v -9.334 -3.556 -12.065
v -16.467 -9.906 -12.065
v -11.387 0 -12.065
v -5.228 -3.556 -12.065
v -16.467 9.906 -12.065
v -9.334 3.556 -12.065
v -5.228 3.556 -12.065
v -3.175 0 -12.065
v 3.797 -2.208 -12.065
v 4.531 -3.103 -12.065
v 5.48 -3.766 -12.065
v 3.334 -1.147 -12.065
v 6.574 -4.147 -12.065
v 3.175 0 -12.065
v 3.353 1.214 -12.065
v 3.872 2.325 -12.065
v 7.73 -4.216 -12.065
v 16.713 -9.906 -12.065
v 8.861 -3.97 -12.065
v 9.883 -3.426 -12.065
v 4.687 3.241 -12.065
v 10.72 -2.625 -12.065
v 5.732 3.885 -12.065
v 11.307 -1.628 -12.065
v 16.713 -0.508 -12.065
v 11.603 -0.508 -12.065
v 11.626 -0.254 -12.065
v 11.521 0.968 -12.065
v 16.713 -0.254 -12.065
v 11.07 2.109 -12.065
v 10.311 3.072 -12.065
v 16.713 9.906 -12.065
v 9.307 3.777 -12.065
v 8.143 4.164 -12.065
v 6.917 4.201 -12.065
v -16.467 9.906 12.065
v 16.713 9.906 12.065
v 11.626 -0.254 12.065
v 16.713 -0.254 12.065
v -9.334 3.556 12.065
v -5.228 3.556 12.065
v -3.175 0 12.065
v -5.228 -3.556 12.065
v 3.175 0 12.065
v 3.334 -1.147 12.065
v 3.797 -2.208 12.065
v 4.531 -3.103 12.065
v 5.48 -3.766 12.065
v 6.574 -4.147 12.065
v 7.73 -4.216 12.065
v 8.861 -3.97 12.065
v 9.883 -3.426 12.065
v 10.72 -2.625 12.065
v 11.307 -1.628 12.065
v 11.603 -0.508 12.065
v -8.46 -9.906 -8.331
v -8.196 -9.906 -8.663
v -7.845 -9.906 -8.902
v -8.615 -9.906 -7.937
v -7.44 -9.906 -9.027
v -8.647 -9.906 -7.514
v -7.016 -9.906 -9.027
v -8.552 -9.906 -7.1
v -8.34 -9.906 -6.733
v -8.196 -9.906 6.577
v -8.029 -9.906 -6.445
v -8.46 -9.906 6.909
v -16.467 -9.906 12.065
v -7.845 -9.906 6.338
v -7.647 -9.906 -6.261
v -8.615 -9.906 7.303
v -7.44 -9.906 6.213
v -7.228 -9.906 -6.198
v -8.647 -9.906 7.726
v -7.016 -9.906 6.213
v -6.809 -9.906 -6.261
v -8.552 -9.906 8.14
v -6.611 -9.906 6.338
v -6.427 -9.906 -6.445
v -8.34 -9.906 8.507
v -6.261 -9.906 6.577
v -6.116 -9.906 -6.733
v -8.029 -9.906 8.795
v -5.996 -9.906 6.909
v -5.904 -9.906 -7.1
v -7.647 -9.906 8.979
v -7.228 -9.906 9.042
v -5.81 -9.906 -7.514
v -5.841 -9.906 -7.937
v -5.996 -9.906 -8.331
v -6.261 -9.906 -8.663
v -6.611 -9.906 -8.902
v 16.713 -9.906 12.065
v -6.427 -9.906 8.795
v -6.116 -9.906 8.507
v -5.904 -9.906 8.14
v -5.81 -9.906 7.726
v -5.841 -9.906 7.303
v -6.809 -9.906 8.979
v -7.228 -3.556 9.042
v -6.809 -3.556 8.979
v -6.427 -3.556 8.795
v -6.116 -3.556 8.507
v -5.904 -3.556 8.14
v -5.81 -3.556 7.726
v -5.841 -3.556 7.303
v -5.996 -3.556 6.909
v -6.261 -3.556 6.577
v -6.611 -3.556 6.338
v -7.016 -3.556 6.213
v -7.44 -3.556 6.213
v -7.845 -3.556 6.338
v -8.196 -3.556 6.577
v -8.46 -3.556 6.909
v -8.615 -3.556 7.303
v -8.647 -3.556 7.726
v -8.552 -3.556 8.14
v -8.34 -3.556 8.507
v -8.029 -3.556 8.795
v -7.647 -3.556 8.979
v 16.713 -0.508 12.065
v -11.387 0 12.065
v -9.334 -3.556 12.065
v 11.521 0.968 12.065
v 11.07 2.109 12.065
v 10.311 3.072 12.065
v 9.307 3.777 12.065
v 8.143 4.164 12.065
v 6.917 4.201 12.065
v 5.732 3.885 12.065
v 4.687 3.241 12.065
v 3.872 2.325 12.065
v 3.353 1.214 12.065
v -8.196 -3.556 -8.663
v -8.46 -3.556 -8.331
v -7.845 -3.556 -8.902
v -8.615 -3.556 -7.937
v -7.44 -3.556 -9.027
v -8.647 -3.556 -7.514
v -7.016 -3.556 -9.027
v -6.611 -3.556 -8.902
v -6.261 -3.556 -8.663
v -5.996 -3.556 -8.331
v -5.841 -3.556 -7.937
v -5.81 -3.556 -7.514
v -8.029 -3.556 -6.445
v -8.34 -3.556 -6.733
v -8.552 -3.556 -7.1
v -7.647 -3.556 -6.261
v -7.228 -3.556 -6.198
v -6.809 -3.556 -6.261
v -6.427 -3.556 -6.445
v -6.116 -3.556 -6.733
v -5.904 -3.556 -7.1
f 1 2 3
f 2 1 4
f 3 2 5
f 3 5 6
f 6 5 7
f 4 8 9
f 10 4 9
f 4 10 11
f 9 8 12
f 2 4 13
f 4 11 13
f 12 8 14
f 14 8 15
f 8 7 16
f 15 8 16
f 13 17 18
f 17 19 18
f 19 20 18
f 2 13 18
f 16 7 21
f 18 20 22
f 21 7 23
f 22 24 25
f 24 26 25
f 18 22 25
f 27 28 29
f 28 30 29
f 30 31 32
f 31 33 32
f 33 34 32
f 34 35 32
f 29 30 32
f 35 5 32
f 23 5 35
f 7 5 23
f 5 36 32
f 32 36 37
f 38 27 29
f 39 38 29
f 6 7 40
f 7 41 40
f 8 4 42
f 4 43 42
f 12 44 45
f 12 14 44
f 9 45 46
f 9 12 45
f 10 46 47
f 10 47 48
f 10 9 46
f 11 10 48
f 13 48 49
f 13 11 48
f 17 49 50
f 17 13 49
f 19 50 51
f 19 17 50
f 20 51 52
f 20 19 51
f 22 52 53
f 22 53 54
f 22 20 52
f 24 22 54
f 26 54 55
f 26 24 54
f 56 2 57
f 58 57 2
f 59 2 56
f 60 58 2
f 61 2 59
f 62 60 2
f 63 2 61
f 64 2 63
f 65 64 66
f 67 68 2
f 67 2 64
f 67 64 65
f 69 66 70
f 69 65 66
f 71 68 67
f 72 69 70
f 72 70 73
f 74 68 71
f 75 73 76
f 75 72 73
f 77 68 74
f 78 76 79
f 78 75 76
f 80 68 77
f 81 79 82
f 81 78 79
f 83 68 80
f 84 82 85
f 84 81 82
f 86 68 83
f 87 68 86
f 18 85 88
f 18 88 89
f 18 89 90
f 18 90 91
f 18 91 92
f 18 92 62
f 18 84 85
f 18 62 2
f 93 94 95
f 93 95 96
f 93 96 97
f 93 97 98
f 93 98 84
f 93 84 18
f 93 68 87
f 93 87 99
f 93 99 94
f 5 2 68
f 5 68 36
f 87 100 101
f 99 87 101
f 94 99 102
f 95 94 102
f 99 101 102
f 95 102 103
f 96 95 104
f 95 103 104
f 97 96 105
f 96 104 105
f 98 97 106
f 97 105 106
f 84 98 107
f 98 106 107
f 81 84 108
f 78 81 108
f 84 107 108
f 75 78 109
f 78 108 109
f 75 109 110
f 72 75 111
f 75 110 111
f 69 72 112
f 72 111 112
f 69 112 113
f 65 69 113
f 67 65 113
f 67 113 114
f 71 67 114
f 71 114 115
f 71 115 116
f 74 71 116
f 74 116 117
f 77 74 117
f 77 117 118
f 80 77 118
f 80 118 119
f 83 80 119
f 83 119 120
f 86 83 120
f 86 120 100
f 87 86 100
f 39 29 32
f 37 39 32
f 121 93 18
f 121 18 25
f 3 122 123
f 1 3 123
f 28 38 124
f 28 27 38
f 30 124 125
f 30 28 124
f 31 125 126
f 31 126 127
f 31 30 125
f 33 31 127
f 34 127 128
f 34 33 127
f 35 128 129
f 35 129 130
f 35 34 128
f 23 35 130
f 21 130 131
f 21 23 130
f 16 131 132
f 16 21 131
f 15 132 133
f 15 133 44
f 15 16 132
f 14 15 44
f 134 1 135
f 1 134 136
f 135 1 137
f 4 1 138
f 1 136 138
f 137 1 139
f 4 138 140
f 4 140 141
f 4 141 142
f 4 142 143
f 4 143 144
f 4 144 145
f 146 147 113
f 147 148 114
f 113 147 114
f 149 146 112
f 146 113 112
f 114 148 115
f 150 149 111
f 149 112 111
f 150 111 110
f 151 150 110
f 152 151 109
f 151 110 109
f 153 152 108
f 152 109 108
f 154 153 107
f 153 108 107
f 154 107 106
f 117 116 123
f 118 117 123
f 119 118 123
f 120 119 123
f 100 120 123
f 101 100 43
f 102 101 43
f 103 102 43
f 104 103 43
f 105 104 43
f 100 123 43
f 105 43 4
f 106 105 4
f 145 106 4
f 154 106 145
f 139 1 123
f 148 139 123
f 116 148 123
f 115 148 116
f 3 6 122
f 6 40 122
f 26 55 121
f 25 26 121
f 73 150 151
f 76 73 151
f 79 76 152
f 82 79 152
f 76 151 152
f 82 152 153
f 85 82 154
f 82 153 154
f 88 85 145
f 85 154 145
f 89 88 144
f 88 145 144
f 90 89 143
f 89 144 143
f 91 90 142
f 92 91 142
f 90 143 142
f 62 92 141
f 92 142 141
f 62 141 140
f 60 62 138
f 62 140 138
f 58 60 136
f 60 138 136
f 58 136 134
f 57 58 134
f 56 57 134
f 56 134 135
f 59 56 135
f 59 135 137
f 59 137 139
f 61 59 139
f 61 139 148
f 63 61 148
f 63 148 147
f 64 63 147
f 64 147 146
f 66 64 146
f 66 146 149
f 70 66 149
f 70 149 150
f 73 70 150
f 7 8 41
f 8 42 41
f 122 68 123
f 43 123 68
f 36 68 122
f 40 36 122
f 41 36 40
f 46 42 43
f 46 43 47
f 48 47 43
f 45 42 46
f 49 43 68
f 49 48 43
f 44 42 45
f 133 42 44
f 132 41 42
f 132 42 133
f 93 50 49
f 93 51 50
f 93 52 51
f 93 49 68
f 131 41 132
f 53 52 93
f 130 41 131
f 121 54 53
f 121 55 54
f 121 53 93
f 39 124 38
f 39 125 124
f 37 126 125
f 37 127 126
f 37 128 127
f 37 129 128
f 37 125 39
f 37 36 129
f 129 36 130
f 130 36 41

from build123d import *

# Parameters (mm, degrees)
SKETCH2_W               = 33.180430229
SKETCH2_H               = 19.812
SKETCH2_R               = 4.2291
BOSS_EXTRUDE3_DEPTH     = 12.065
CUT_EXTRUDE5_REACH      = 24.87
SKETCH7_R               = 1.4224
CUT_EXTRUDE8_DEPTH      = 23.86983051
CUT_EXTRUDE8_DEPTH_BACK = 23.86983051
SKETCH8_W               = 12.7
SKETCH8_H               = 0.254


with BuildPart() as part:
    # Sketch2 → Boss-Extrude3 (new, symmetric)
    with BuildSketch(Plane.XY):
        with Locations((0.122984885, 0.000254)):
            Rectangle(SKETCH2_W, SKETCH2_H)
        with Locations((7.4041, 0.000254)):
            Circle(SKETCH2_R, mode=Mode.SUBTRACT)
        Polygon((-11.387230229, 0.000254), (-9.334172672, -3.555746), (-5.228057557, -3.555746), (-3.175, 0.000254), (-5.228057557, 3.556254), (-9.334172672, 3.556254), align=None, mode=Mode.SUBTRACT)
    extrude(amount=BOSS_EXTRUDE3_DEPTH, both=True)

    # Sketch7 → Cut-Extrude5 (cut, up to next)
    with BuildSketch(Plane(origin=(0, 0, 0), x_dir=(1, 0, 0), z_dir=(0, 1, 0)), mode=Mode.PRIVATE) as cut_extrude5_sk1:
        with Locations((-7.228125784, -7.62)):
            Circle(SKETCH7_R)
    cut_extrude5_tool1 = extrude(cut_extrude5_sk1.sketch, amount=-CUT_EXTRUDE5_REACH, mode=Mode.PRIVATE) & part.part
    # Sketch7 → Cut-Extrude5 (cut, up to next)
    with BuildSketch(Plane(origin=(0, 0, 0), x_dir=(1, 0, 0), z_dir=(0, 1, 0)), mode=Mode.PRIVATE) as cut_extrude5_sk2:
        with Locations((-7.228125784, 7.62)):
            Circle(SKETCH7_R)
    cut_extrude5_tool2 = extrude(cut_extrude5_sk2.sketch, amount=-CUT_EXTRUDE5_REACH, mode=Mode.PRIVATE) & part.part
    add(cut_extrude5_tool1.solids().sort_by_distance((-7.228126, 0, 7.62))[0], mode=Mode.SUBTRACT)
    add(cut_extrude5_tool2.solids().sort_by_distance((-7.228126, 0, -7.62))[0], mode=Mode.SUBTRACT)

    # Sketch8 → Cut-Extrude8 (cut, two sides: drawn at the far end of the back side and taken through both)
    with BuildSketch(Plane.XY.offset(-CUT_EXTRUDE8_DEPTH_BACK)):
        with Locations((13.86896495, -0.381)):
            Rectangle(SKETCH8_W, SKETCH8_H)
    extrude(amount=CUT_EXTRUDE8_DEPTH + CUT_EXTRUDE8_DEPTH_BACK, mode=Mode.SUBTRACT)


solid = part.part
